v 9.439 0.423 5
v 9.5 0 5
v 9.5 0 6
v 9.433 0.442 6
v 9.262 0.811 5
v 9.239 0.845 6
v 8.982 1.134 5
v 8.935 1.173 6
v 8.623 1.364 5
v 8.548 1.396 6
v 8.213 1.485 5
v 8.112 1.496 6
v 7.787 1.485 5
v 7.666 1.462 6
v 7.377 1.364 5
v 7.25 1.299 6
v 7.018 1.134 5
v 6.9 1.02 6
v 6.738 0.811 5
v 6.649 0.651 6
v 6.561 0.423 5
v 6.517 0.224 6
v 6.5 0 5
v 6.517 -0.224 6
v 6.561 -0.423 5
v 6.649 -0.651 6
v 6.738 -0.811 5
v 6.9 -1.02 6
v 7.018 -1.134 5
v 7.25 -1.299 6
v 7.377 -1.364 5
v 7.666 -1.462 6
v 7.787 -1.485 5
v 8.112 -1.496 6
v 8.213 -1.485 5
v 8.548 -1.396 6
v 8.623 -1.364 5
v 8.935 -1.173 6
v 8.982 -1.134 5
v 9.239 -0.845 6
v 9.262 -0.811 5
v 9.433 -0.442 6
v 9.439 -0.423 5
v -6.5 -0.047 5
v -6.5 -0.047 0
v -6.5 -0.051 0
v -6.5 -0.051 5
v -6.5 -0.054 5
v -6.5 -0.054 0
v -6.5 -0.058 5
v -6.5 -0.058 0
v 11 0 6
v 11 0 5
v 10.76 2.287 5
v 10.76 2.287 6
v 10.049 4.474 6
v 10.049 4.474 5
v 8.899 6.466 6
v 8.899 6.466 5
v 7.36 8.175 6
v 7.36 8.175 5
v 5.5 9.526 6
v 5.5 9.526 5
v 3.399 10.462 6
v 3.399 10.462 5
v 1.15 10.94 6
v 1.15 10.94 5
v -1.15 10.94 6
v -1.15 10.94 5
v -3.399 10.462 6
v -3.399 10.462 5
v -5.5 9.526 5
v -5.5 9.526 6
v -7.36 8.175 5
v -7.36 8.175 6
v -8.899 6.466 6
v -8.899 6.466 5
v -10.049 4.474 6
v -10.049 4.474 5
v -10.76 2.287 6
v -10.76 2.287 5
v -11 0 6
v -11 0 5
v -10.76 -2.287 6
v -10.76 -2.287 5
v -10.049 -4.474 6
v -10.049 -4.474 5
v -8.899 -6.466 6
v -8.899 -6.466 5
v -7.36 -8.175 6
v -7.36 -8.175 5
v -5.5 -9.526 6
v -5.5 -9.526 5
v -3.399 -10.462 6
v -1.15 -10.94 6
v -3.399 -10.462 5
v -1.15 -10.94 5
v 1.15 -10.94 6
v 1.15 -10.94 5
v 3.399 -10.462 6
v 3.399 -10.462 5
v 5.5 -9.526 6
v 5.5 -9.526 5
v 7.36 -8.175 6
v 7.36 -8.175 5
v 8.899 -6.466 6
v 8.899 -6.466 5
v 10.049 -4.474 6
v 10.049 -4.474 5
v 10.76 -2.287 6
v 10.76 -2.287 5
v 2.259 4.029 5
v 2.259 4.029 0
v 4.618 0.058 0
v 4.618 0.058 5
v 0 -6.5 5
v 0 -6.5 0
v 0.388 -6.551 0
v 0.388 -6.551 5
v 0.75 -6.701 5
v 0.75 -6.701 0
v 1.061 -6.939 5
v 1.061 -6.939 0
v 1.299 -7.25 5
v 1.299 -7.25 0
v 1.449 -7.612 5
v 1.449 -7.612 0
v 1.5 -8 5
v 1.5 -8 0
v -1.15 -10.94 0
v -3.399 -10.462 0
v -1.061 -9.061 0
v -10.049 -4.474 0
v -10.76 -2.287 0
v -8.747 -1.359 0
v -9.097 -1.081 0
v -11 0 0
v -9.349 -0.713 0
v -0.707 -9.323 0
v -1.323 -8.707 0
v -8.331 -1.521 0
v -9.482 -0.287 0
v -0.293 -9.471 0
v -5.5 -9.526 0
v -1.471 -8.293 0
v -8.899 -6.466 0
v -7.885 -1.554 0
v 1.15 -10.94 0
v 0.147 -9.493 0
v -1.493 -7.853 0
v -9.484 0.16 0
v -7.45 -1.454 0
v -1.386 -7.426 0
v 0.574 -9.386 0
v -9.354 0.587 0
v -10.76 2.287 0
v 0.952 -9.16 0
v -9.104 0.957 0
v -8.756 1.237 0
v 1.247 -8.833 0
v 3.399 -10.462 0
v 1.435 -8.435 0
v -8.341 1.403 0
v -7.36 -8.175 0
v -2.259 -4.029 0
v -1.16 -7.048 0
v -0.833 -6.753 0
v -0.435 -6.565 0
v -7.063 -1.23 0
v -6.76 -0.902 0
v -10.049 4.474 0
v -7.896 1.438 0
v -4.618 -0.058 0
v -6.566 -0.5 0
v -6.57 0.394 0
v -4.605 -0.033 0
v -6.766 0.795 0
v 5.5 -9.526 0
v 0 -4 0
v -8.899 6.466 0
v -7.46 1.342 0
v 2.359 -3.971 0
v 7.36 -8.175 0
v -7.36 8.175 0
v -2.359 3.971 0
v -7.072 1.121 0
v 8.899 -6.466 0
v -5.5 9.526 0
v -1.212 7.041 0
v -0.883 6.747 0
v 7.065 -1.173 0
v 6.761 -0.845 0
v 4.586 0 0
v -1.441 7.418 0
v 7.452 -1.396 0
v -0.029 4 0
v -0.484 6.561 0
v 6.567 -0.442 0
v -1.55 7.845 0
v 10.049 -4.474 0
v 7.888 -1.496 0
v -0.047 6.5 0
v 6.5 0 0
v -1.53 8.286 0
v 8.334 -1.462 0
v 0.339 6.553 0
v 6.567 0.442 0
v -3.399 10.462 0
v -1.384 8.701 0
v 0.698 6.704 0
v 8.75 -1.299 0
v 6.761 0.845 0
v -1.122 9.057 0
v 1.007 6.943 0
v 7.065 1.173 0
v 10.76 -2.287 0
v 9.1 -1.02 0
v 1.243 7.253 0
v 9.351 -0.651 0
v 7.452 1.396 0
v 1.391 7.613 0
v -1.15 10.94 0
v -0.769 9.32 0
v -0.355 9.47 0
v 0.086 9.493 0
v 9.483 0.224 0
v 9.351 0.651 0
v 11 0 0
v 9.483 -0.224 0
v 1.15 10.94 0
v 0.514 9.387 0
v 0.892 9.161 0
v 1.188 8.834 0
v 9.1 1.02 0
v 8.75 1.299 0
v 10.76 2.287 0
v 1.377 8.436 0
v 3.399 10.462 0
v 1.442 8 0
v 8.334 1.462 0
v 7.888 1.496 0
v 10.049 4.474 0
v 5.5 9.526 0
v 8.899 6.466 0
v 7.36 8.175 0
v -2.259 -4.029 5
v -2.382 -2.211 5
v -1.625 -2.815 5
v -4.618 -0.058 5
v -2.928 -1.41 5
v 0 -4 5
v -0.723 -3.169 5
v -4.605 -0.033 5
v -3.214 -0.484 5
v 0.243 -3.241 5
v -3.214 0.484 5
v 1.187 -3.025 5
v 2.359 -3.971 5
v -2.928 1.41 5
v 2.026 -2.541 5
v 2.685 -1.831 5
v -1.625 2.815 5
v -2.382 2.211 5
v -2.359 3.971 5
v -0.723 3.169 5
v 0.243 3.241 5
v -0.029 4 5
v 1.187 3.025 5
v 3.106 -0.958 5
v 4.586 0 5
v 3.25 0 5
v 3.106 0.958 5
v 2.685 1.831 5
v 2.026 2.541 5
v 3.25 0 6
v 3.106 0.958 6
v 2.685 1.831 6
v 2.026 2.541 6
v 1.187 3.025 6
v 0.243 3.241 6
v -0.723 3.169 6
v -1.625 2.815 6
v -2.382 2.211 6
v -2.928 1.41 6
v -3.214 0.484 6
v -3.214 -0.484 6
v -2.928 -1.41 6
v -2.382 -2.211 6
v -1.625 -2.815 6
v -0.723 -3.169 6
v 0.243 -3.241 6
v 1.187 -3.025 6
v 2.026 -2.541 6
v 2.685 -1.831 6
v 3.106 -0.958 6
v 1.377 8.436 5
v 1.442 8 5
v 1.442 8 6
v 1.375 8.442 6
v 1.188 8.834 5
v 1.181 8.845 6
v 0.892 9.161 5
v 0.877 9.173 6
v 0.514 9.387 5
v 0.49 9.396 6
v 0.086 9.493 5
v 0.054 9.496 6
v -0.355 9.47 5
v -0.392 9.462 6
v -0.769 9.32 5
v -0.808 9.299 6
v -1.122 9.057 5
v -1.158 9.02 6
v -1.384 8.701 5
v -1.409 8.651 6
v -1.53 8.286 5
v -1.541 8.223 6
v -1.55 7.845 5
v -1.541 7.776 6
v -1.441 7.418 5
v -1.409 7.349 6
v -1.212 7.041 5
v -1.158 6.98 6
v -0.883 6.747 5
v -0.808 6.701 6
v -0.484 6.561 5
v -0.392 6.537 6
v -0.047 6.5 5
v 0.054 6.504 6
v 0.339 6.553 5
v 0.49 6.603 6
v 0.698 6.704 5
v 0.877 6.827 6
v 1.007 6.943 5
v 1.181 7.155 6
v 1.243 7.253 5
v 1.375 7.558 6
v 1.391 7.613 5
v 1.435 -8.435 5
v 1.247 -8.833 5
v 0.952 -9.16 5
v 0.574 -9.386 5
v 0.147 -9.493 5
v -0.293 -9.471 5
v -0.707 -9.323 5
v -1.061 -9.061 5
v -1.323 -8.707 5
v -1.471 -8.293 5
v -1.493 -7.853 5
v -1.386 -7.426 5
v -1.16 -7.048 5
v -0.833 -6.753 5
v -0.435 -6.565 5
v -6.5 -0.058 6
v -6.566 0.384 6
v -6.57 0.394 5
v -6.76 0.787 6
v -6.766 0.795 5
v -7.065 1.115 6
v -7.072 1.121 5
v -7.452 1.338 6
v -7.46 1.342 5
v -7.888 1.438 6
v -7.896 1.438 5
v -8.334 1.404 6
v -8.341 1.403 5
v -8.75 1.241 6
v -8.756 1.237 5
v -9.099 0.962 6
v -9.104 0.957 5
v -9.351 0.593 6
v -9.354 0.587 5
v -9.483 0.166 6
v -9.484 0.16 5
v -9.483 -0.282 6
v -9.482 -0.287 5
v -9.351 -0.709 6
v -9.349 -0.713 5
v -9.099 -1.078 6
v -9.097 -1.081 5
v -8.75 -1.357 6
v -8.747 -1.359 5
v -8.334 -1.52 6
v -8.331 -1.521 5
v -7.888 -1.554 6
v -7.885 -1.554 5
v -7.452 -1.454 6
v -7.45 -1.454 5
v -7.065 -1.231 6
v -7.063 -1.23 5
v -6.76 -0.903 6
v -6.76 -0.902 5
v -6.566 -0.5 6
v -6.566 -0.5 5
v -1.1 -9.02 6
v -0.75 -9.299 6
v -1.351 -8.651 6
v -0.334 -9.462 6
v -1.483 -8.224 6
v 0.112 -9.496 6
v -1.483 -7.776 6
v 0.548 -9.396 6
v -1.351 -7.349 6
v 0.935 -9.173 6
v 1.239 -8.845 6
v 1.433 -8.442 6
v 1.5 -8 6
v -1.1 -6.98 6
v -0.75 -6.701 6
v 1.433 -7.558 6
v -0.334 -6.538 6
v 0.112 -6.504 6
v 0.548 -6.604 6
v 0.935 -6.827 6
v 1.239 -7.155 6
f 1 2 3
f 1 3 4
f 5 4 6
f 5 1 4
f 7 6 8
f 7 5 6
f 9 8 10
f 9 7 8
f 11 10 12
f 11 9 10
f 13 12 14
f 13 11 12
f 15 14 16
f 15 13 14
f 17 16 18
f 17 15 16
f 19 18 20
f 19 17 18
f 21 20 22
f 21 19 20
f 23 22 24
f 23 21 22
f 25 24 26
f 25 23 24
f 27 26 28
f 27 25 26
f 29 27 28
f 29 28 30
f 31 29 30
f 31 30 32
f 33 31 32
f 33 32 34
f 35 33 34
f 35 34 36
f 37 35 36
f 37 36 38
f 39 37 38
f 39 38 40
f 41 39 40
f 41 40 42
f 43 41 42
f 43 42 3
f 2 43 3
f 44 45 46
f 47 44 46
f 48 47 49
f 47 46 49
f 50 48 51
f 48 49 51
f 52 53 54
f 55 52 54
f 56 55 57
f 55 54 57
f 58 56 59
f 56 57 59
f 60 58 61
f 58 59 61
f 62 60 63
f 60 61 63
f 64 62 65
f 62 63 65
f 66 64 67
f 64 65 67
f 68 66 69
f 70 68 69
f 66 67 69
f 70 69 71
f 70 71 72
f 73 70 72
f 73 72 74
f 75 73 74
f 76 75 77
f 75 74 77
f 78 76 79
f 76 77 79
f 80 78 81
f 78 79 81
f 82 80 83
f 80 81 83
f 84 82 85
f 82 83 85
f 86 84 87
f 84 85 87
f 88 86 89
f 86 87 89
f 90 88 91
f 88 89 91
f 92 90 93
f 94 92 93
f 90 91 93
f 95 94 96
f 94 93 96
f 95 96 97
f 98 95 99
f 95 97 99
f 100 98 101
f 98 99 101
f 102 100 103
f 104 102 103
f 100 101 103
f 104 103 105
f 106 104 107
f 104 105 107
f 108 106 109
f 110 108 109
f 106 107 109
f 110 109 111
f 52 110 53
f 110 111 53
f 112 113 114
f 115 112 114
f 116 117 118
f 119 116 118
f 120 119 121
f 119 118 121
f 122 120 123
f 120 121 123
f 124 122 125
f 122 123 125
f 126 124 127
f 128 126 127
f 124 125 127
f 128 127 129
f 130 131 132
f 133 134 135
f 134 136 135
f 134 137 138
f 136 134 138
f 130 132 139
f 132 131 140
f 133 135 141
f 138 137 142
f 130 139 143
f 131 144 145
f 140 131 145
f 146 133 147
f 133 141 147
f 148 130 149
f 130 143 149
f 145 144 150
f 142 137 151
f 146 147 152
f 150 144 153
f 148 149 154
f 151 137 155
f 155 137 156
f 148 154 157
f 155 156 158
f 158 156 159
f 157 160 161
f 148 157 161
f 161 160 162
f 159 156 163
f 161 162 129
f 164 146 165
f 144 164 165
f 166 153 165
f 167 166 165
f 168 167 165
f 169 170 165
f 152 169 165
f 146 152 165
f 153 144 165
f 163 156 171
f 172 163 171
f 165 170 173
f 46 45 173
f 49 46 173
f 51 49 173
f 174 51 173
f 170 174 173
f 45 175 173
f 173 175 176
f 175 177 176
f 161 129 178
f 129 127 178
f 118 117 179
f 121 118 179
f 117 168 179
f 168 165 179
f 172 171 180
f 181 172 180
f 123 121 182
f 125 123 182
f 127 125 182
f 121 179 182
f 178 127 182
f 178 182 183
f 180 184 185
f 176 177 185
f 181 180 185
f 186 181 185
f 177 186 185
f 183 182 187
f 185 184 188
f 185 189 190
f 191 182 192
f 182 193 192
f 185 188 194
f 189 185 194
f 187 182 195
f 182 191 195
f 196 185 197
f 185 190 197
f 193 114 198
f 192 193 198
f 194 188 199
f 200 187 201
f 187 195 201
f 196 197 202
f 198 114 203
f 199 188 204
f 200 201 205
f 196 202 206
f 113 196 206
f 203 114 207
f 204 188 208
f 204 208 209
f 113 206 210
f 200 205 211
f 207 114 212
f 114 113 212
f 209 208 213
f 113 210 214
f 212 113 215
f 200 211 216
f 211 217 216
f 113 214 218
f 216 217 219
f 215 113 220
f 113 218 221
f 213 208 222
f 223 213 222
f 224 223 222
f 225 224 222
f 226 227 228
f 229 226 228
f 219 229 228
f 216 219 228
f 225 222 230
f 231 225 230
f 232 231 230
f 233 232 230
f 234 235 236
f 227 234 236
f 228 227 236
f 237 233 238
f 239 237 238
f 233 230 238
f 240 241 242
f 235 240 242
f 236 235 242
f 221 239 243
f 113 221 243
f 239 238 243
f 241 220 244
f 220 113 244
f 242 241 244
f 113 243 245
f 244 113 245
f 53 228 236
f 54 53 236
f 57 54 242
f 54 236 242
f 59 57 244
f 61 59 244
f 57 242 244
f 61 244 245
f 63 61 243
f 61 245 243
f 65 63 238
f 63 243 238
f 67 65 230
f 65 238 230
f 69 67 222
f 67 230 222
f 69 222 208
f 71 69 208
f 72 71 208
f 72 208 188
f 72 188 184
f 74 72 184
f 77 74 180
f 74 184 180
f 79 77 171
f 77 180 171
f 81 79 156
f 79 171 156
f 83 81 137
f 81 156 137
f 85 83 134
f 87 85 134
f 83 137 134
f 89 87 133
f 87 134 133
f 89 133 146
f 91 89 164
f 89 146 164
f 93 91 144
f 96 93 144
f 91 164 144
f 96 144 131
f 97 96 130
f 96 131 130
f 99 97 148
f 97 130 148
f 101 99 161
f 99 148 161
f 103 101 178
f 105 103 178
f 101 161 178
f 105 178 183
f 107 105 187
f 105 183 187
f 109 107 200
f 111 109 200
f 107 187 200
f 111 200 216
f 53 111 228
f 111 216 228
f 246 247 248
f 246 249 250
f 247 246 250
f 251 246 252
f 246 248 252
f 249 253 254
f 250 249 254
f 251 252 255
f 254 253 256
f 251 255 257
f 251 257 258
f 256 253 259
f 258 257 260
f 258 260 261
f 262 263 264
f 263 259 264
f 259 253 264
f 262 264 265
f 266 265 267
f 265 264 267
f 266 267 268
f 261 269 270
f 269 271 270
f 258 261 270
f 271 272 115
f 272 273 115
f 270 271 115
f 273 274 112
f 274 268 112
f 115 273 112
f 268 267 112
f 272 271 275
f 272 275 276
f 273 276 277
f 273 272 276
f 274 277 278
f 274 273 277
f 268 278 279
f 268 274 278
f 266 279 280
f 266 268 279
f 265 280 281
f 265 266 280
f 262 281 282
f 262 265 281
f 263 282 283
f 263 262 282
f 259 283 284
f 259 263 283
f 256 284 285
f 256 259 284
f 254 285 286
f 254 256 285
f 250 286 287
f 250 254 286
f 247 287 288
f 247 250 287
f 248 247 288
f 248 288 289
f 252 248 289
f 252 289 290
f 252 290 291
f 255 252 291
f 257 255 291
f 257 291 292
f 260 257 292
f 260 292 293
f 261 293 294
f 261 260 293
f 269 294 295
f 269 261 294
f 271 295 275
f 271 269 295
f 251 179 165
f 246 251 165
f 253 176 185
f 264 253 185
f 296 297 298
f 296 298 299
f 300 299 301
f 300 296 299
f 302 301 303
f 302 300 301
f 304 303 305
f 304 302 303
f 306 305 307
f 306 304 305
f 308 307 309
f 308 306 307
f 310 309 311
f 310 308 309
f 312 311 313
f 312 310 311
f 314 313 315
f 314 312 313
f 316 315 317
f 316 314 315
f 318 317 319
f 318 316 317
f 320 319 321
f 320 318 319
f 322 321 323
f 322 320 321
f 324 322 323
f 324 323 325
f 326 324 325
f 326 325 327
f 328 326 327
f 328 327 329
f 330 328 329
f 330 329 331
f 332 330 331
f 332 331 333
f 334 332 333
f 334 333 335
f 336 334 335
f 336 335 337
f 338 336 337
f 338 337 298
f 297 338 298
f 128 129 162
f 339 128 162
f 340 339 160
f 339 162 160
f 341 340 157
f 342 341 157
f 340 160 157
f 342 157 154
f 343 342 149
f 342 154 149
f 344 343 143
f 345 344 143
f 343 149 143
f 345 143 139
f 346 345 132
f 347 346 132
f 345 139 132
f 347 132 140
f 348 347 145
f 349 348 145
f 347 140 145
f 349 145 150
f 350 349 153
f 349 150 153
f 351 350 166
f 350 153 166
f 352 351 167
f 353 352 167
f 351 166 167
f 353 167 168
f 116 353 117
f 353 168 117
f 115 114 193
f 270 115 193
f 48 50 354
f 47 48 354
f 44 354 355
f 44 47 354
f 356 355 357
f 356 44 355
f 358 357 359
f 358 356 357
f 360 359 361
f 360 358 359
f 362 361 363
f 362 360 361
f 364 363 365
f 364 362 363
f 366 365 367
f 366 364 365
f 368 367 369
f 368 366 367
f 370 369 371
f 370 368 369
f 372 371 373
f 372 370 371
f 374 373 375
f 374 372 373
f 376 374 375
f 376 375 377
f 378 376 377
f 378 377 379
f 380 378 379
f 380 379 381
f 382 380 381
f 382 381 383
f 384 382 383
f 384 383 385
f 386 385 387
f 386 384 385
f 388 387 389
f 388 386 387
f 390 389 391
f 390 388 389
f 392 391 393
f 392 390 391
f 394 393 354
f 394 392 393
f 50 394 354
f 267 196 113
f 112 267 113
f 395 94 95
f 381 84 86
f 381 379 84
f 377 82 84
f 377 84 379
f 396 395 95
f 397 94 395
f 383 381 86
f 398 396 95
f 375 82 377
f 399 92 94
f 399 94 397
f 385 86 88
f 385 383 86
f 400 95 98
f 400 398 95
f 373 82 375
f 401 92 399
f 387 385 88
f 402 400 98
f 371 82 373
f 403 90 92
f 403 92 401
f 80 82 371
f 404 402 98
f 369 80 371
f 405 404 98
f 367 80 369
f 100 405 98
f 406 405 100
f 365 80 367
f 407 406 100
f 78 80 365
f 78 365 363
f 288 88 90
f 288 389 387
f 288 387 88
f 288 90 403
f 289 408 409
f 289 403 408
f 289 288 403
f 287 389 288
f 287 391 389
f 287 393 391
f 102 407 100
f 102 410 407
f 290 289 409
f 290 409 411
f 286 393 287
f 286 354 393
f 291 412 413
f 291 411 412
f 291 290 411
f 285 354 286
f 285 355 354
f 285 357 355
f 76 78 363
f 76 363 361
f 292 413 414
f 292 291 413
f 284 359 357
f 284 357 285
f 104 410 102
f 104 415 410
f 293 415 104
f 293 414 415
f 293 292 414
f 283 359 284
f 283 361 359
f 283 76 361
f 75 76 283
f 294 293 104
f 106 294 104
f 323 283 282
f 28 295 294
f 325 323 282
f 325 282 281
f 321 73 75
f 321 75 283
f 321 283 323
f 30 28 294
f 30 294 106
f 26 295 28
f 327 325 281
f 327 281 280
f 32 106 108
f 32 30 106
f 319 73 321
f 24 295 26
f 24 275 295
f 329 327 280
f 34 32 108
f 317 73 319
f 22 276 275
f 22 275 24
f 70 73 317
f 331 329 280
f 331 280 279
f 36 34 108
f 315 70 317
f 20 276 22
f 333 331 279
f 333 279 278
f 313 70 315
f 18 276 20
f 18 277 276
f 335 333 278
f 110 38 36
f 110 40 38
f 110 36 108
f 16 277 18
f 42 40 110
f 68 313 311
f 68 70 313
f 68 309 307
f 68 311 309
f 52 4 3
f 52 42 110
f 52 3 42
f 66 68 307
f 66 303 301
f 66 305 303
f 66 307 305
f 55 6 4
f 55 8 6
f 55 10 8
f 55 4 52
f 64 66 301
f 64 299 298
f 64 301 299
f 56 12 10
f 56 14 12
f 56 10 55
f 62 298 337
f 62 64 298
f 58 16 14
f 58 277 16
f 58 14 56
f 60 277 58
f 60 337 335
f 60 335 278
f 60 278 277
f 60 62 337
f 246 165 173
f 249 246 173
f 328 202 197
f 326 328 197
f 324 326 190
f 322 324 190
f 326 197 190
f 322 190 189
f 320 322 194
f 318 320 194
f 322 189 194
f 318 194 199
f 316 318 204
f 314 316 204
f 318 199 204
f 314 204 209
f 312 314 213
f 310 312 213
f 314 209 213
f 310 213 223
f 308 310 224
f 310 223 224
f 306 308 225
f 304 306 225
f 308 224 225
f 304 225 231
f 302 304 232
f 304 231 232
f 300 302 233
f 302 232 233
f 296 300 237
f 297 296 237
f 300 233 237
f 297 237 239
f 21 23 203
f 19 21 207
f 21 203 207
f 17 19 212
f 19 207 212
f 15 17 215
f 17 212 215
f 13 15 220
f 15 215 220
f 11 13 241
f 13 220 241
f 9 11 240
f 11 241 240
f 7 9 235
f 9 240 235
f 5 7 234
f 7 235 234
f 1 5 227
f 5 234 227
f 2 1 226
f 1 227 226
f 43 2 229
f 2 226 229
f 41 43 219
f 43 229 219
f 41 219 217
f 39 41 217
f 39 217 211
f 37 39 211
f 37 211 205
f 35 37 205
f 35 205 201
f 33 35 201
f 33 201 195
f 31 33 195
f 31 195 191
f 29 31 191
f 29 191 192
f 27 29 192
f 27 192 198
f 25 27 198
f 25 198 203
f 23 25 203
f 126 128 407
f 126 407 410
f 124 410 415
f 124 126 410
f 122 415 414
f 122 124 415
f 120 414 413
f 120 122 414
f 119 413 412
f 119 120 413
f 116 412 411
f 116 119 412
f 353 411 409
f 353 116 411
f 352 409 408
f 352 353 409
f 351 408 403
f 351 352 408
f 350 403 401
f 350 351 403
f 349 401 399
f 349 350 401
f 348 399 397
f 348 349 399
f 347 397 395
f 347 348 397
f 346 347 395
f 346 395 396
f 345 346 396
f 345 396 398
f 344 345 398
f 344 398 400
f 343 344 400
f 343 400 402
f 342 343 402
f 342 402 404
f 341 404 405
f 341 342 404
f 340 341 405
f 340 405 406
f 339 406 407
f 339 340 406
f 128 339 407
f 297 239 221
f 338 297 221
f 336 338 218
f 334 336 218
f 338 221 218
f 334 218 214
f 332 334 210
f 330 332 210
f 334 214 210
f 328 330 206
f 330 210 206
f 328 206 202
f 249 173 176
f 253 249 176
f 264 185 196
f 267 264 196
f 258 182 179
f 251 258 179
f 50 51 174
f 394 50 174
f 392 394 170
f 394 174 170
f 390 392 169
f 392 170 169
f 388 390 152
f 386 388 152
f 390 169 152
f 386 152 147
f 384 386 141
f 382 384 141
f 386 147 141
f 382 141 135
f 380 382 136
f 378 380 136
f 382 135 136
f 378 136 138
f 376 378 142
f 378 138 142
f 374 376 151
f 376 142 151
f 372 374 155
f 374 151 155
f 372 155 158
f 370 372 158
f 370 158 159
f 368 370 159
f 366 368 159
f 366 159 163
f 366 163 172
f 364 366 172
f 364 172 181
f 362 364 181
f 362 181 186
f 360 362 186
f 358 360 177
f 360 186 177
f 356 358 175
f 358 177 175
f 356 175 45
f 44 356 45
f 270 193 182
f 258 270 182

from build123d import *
from build123d import SkipClean  # not in build123d's __all__

# Parameters (mm, degrees)
F0_R     = 11
F1_DEPTH = 5
F2_R     = 11
F2_R_2   = 1.5
F2_R_3   = 3.25
F3_DEPTH = 1


with BuildPart() as f1:
    # F0 (on Top) → F1 (new body)
    with BuildSketch(Plane.XY):
        Circle(F0_R)
        with BuildLine():
            ThreePointArc((-6.4997900966, -0.0579517981), (-9.4997802573, -0.0633848148), (-6.4998294535, -0.0470858359))
            ThreePointArc((-6.4998294535, -0.0470858359), (-6.4997999358, -0.0525187813), (-6.4997900966, -0.0579517981))
        make_face(mode=Mode.SUBTRACT)
        with BuildLine():
            ThreePointArc((1.5, -8), (-1.0606601718, -9.0606601718), (0, -6.5))
            ThreePointArc((0, -6.5), (1.0606601718, -6.9393398282), (1.5, -8))
        make_face(mode=Mode.SUBTRACT)
        with BuildLine():
            ThreePointArc((1.4420482019, 7.9997900966), (1.0065431393, 6.9429786051), (-0.0470858359, 6.4998294535))
            ThreePointArc((-0.0470858359, 6.4998294535), (-1.1224467354, 9.056601588), (1.4420482019, 7.9997900966))
        make_face(mode=Mode.SUBTRACT)
        Polygon((-0.0289763065, 3.9999512958), (2.259031561, 4.0286610356), (4.6184385806, 0.0579517981), (4.5859426869, 0), (2.3594070196, -3.9707092376), (0, -4.0003148882), (-2.259031561, -4.0286610356), (-4.6184385806, -0.0579517981), (-4.6046471933, -0.0333568232), (-2.3594070196, 3.9707092376), align=None, mode=Mode.SUBTRACT)
        with BuildLine():
            ThreePointArc((9.5, 0), (8, -1.5), (6.5, 0))
            ThreePointArc((6.5, 0), (8, 1.5), (9.5, 0))
        make_face(mode=Mode.SUBTRACT)
    extrude(amount=F1_DEPTH)

    # F2 (on face) → F3 (join)
    with BuildSketch(Plane.XY.offset(5)):
        Circle(F2_R)
        with Locations((-7.9997900966, -0.0579517981)):
            Circle(F2_R_2, mode=Mode.SUBTRACT)
        with Locations((0, -8)):
            Circle(F2_R_2, mode=Mode.SUBTRACT)
        with Locations((-0.0579517981, 7.9997900966)):
            Circle(F2_R_2, mode=Mode.SUBTRACT)
        Polygon((-4.6184385806, -0.0579517981), (-2.3594070196, 3.9707092376), (2.259031561, 4.0286610356), (4.6184385806, 0.0579517981), (2.3594070196, -3.9707092376), (-2.259031561, -4.0286610356), align=None, mode=Mode.SUBTRACT)
        with Locations((8, 0)):
            Circle(F2_R_2, mode=Mode.SUBTRACT)
        Polygon((2.259031561, 4.0286610356), (-2.3594070196, 3.9707092376), (-4.6184385806, -0.0579517981), (-2.259031561, -4.0286610356), (2.3594070196, -3.9707092376), (4.6184385806, 0.0579517981), align=None)
        Circle(F2_R_3, mode=Mode.SUBTRACT)
    with SkipClean():  # cleaning this boolean's faces spoils the solid; the shape is the same uncleaned
        extrude(amount=F3_DEPTH)


solid = f1.part
